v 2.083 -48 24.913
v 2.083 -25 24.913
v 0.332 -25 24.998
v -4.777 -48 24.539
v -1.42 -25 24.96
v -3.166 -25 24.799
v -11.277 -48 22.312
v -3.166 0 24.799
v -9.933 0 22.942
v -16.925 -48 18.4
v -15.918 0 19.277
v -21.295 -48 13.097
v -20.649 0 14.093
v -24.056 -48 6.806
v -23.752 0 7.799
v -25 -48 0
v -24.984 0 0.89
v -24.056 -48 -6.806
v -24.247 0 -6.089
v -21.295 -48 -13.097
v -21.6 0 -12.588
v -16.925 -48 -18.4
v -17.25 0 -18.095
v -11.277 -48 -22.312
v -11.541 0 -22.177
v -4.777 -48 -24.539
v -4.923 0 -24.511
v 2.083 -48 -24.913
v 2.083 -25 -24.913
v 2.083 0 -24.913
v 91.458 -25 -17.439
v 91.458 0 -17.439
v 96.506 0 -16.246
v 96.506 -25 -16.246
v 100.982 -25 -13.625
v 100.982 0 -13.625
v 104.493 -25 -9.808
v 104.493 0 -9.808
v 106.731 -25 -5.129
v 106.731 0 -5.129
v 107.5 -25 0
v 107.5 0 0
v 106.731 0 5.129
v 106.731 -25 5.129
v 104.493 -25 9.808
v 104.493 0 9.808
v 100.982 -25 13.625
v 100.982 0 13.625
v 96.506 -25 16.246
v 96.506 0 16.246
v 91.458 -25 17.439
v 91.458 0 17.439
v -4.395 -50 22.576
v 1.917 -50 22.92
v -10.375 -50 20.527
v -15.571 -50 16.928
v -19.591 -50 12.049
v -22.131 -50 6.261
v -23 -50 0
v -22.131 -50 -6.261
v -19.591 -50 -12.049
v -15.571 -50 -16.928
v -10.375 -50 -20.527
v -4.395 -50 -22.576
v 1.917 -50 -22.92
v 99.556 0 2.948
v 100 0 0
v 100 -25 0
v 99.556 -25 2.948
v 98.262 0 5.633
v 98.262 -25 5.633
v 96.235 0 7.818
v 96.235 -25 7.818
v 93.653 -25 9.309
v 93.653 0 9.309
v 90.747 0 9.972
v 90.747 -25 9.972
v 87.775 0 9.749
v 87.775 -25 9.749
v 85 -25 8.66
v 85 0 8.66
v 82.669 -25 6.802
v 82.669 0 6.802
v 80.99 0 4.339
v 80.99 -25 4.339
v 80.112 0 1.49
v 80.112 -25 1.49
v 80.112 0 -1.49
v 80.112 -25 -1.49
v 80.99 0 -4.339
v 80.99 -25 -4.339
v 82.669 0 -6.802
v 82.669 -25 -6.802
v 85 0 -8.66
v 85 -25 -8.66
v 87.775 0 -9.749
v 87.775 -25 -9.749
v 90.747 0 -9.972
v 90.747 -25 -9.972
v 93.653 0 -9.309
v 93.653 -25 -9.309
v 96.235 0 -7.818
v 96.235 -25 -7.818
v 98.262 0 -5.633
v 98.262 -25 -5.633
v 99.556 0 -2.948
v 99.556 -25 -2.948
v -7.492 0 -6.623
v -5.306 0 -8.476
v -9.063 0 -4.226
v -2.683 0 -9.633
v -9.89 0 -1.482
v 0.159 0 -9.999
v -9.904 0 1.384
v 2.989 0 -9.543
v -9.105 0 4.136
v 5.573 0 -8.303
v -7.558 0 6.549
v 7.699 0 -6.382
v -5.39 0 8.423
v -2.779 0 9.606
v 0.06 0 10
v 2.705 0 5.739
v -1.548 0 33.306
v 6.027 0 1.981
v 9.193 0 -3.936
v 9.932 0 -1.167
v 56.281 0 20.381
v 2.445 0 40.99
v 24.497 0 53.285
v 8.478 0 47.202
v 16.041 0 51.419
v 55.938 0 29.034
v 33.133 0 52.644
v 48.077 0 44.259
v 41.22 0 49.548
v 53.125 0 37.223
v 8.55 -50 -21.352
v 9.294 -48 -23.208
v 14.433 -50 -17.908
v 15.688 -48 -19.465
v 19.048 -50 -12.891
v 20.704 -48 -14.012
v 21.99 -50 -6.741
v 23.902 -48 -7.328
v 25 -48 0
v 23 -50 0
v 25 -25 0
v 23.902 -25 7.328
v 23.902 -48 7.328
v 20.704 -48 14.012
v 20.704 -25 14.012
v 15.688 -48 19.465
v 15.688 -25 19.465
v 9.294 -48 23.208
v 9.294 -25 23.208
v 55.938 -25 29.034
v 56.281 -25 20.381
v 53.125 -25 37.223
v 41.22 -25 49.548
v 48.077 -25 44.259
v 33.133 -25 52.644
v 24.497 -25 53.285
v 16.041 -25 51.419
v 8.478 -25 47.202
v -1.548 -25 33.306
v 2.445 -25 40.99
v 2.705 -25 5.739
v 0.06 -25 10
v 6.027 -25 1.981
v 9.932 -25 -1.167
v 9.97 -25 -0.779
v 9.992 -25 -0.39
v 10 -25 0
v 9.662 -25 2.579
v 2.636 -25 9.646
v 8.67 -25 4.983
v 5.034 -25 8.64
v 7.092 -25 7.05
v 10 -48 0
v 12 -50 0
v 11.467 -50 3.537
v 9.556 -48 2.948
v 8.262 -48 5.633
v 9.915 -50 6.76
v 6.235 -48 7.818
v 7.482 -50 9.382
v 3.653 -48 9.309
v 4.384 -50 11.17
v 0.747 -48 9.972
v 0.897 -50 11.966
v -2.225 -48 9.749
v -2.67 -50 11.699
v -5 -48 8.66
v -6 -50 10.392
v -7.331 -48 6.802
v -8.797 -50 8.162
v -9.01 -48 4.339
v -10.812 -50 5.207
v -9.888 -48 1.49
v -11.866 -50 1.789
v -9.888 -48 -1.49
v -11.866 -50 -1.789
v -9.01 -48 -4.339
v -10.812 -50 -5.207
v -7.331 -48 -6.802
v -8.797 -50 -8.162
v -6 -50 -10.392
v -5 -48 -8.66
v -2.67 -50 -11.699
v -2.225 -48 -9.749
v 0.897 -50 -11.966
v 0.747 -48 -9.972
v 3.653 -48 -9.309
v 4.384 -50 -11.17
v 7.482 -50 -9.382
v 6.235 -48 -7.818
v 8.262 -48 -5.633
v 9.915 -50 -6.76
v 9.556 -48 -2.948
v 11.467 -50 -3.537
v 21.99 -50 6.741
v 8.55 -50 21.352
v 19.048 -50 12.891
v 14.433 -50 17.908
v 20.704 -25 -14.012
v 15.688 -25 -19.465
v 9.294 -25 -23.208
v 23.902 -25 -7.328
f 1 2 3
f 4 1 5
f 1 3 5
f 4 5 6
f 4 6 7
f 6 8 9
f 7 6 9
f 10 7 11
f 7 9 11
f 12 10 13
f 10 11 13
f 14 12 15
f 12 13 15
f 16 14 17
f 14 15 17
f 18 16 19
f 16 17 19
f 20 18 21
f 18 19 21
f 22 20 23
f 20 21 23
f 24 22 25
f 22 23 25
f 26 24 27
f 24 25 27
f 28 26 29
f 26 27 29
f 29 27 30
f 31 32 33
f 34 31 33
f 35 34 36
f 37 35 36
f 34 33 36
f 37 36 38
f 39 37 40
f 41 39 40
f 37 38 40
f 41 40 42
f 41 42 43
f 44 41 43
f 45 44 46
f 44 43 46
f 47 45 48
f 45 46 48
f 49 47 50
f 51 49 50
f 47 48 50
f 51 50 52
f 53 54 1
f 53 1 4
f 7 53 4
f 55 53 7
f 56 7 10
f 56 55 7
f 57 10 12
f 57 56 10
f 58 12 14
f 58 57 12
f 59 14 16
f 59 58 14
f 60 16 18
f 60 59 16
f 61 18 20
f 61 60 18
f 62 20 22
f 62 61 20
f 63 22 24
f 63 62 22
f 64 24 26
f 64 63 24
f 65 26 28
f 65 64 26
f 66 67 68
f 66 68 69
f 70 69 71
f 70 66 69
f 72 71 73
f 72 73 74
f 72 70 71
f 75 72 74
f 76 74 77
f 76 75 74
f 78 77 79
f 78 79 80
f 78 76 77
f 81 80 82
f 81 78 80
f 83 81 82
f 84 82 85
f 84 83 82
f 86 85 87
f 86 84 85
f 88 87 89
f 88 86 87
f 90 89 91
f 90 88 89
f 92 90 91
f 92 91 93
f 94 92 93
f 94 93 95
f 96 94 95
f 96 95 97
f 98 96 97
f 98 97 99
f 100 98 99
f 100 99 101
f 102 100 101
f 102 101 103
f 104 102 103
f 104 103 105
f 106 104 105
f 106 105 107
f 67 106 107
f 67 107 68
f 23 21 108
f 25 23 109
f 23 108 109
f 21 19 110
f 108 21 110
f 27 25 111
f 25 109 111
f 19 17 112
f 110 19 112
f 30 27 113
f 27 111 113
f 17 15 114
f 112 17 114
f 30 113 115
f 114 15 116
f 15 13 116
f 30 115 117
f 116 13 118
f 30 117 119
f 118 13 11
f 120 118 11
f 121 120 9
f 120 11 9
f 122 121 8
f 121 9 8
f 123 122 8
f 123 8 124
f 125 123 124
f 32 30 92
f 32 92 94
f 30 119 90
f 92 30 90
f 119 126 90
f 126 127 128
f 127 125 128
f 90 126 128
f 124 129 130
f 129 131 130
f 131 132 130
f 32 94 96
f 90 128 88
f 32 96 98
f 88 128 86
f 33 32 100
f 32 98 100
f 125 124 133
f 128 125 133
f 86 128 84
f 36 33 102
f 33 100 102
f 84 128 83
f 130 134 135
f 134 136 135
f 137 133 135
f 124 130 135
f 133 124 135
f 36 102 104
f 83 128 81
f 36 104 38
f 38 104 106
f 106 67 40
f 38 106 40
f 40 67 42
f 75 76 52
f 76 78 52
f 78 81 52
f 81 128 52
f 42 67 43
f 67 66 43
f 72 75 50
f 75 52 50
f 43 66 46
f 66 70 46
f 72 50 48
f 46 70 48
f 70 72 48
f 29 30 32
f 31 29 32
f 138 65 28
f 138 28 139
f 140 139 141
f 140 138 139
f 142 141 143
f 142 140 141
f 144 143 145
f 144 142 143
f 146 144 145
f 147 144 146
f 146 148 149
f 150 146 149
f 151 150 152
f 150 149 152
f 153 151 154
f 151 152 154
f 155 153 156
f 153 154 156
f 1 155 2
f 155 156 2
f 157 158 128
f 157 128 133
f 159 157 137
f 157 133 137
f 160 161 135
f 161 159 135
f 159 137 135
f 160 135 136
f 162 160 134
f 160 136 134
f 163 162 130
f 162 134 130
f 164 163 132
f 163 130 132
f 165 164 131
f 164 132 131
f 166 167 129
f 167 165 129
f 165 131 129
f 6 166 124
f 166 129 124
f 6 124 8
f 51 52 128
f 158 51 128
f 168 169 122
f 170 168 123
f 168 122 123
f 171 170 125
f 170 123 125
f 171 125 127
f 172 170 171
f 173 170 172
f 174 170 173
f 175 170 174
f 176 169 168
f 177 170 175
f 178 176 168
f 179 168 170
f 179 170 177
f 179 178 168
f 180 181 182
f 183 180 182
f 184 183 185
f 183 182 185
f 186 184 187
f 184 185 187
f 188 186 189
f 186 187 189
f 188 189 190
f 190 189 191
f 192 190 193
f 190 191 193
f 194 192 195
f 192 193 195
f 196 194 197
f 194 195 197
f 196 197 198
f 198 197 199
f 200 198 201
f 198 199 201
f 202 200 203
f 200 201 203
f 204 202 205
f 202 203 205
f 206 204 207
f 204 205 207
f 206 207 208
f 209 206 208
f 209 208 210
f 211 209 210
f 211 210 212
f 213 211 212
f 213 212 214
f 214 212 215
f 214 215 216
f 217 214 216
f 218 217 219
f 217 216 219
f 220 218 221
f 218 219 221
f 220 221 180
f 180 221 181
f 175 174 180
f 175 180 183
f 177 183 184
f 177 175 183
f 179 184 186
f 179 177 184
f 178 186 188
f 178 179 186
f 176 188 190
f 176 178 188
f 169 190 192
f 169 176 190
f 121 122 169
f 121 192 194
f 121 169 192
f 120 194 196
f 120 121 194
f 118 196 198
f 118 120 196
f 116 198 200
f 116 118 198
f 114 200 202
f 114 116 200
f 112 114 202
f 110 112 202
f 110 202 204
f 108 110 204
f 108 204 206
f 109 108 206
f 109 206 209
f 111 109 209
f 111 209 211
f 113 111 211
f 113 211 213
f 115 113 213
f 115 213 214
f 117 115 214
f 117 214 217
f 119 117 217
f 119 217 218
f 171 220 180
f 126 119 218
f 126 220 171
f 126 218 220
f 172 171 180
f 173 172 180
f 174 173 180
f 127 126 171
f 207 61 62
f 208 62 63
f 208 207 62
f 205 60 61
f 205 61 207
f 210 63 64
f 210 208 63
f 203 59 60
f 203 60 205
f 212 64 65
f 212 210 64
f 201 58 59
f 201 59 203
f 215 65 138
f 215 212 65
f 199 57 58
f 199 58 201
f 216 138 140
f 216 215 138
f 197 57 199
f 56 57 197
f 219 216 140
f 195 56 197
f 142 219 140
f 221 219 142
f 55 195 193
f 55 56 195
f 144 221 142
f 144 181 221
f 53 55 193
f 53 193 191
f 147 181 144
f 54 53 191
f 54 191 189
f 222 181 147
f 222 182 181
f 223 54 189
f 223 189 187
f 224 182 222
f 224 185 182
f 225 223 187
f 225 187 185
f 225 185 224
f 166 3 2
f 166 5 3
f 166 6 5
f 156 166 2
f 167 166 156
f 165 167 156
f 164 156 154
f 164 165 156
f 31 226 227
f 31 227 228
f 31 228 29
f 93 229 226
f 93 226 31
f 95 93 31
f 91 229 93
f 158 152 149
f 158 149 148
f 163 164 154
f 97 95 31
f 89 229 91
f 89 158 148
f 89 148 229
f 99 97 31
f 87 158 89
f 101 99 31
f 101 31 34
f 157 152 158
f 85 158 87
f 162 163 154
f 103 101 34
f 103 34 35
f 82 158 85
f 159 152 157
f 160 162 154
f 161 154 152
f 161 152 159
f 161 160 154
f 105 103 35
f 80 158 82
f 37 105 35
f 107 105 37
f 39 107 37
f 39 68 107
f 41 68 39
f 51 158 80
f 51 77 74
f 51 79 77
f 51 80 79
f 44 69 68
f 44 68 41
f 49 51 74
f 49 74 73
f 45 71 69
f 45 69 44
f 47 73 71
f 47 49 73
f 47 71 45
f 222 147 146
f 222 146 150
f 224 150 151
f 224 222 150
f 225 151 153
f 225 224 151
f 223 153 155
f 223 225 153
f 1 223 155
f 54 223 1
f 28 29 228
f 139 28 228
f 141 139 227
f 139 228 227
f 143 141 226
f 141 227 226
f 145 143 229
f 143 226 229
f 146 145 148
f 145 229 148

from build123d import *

# Parameters (mm, degrees)
F0_R     = 10
F1_DEPTH = 25
F2_DEPTH = 50
F3_SIZE  = 2
F5_R     = 29.820432
F6_DEPTH = 25


with BuildPart() as f1:
    # F0 (on Front) → F1 (new body)
    with BuildSketch(Plane.XZ):
        with BuildLine():
            ThreePointArc((2.083333, -24.913043), (18.399502, -16.92508), (25, 0))
            ThreePointArc((25, 0), (18.399502, 16.92508), (2.083333, 24.913043))
            ThreePointArc((2.083333, 24.913043), (-25, 0), (2.083333, -24.913043))
        make_face()
        Circle(F0_R, mode=Mode.SUBTRACT)
        with BuildLine():
            ThreePointArc((2.083333, 24.913043), (18.399502, 16.92508), (25, 0))
            ThreePointArc((25, 0), (18.399502, -16.92508), (2.083333, -24.913043))
            Line((2.083333, -24.913043), (91.458333, -17.43913))
            ThreePointArc((91.458333, -17.43913), (72.5, 0), (91.458333, 17.43913))
            Line((91.458333, 17.43913), (2.083333, 24.913043))
        make_face()
        with BuildLine():
            ThreePointArc((107.5, 0), (102.879651, 11.847556), (91.458333, 17.43913))
            ThreePointArc((91.458333, 17.43913), (72.5, 0), (91.458333, -17.43913))
            ThreePointArc((91.458333, -17.43913), (102.879651, -11.847556), (107.5, 0))
        make_face()
        with Locations((90, 0)):
            Circle(F0_R, mode=Mode.SUBTRACT)
    extrude(amount=F1_DEPTH)

    # F0 (on Front) → F2 (join)
    with BuildSketch(Plane.XZ):
        with BuildLine():
            ThreePointArc((2.083333, -24.913043), (18.399502, -16.92508), (25, 0))
            ThreePointArc((25, 0), (18.399502, 16.92508), (2.083333, 24.913043))
            ThreePointArc((2.083333, 24.913043), (-25, 0), (2.083333, -24.913043))
        make_face()
        Circle(F0_R, mode=Mode.SUBTRACT)
    extrude(amount=F2_DEPTH)

    # F3
    f3_edges = [f1.edges().sort_by_distance(p)[0] for p in [
        (-2.083333, -50, 24.913043),
        (-10, -50, 0),
        (80, -25, 0),
    ]]
    chamfer(f3_edges, length=F3_SIZE)

    # F0 (on Front) + F5 (on face) → F6 (join)
    with BuildSketch(Plane.XZ):
        with BuildLine():
            ThreePointArc((2.083333, -24.913043), (18.399502, -16.92508), (25, 0))
            ThreePointArc((25, 0), (18.399502, 16.92508), (2.083333, 24.913043))
            ThreePointArc((2.083333, 24.913043), (-25, 0), (2.083333, -24.913043))
        make_face()
        Circle(F0_R, mode=Mode.SUBTRACT)
        with BuildLine():
            ThreePointArc((2.083333, 24.913043), (18.399502, 16.92508), (25, 0))
            ThreePointArc((25, 0), (18.399502, -16.92508), (2.083333, -24.913043))
            Line((2.083333, -24.913043), (91.458333, -17.43913))
            ThreePointArc((91.458333, -17.43913), (72.5, 0), (91.458333, 17.43913))
            Line((91.458333, 17.43913), (2.083333, 24.913043))
        make_face()
        with BuildLine():
            ThreePointArc((107.5, 0), (102.879651, 11.847556), (91.458333, 17.43913))
            ThreePointArc((91.458333, 17.43913), (72.5, 0), (91.458333, -17.43913))
            ThreePointArc((91.458333, -17.43913), (102.879651, -11.847556), (107.5, 0))
        make_face()
        with Locations((90, 0)):
            Circle(F0_R, mode=Mode.SUBTRACT)
    with BuildSketch(Plane.XZ):
        with Locations((26.628146, 23.54129)):
            Circle(F5_R)
    extrude(amount=F6_DEPTH)


solid = f1.part
